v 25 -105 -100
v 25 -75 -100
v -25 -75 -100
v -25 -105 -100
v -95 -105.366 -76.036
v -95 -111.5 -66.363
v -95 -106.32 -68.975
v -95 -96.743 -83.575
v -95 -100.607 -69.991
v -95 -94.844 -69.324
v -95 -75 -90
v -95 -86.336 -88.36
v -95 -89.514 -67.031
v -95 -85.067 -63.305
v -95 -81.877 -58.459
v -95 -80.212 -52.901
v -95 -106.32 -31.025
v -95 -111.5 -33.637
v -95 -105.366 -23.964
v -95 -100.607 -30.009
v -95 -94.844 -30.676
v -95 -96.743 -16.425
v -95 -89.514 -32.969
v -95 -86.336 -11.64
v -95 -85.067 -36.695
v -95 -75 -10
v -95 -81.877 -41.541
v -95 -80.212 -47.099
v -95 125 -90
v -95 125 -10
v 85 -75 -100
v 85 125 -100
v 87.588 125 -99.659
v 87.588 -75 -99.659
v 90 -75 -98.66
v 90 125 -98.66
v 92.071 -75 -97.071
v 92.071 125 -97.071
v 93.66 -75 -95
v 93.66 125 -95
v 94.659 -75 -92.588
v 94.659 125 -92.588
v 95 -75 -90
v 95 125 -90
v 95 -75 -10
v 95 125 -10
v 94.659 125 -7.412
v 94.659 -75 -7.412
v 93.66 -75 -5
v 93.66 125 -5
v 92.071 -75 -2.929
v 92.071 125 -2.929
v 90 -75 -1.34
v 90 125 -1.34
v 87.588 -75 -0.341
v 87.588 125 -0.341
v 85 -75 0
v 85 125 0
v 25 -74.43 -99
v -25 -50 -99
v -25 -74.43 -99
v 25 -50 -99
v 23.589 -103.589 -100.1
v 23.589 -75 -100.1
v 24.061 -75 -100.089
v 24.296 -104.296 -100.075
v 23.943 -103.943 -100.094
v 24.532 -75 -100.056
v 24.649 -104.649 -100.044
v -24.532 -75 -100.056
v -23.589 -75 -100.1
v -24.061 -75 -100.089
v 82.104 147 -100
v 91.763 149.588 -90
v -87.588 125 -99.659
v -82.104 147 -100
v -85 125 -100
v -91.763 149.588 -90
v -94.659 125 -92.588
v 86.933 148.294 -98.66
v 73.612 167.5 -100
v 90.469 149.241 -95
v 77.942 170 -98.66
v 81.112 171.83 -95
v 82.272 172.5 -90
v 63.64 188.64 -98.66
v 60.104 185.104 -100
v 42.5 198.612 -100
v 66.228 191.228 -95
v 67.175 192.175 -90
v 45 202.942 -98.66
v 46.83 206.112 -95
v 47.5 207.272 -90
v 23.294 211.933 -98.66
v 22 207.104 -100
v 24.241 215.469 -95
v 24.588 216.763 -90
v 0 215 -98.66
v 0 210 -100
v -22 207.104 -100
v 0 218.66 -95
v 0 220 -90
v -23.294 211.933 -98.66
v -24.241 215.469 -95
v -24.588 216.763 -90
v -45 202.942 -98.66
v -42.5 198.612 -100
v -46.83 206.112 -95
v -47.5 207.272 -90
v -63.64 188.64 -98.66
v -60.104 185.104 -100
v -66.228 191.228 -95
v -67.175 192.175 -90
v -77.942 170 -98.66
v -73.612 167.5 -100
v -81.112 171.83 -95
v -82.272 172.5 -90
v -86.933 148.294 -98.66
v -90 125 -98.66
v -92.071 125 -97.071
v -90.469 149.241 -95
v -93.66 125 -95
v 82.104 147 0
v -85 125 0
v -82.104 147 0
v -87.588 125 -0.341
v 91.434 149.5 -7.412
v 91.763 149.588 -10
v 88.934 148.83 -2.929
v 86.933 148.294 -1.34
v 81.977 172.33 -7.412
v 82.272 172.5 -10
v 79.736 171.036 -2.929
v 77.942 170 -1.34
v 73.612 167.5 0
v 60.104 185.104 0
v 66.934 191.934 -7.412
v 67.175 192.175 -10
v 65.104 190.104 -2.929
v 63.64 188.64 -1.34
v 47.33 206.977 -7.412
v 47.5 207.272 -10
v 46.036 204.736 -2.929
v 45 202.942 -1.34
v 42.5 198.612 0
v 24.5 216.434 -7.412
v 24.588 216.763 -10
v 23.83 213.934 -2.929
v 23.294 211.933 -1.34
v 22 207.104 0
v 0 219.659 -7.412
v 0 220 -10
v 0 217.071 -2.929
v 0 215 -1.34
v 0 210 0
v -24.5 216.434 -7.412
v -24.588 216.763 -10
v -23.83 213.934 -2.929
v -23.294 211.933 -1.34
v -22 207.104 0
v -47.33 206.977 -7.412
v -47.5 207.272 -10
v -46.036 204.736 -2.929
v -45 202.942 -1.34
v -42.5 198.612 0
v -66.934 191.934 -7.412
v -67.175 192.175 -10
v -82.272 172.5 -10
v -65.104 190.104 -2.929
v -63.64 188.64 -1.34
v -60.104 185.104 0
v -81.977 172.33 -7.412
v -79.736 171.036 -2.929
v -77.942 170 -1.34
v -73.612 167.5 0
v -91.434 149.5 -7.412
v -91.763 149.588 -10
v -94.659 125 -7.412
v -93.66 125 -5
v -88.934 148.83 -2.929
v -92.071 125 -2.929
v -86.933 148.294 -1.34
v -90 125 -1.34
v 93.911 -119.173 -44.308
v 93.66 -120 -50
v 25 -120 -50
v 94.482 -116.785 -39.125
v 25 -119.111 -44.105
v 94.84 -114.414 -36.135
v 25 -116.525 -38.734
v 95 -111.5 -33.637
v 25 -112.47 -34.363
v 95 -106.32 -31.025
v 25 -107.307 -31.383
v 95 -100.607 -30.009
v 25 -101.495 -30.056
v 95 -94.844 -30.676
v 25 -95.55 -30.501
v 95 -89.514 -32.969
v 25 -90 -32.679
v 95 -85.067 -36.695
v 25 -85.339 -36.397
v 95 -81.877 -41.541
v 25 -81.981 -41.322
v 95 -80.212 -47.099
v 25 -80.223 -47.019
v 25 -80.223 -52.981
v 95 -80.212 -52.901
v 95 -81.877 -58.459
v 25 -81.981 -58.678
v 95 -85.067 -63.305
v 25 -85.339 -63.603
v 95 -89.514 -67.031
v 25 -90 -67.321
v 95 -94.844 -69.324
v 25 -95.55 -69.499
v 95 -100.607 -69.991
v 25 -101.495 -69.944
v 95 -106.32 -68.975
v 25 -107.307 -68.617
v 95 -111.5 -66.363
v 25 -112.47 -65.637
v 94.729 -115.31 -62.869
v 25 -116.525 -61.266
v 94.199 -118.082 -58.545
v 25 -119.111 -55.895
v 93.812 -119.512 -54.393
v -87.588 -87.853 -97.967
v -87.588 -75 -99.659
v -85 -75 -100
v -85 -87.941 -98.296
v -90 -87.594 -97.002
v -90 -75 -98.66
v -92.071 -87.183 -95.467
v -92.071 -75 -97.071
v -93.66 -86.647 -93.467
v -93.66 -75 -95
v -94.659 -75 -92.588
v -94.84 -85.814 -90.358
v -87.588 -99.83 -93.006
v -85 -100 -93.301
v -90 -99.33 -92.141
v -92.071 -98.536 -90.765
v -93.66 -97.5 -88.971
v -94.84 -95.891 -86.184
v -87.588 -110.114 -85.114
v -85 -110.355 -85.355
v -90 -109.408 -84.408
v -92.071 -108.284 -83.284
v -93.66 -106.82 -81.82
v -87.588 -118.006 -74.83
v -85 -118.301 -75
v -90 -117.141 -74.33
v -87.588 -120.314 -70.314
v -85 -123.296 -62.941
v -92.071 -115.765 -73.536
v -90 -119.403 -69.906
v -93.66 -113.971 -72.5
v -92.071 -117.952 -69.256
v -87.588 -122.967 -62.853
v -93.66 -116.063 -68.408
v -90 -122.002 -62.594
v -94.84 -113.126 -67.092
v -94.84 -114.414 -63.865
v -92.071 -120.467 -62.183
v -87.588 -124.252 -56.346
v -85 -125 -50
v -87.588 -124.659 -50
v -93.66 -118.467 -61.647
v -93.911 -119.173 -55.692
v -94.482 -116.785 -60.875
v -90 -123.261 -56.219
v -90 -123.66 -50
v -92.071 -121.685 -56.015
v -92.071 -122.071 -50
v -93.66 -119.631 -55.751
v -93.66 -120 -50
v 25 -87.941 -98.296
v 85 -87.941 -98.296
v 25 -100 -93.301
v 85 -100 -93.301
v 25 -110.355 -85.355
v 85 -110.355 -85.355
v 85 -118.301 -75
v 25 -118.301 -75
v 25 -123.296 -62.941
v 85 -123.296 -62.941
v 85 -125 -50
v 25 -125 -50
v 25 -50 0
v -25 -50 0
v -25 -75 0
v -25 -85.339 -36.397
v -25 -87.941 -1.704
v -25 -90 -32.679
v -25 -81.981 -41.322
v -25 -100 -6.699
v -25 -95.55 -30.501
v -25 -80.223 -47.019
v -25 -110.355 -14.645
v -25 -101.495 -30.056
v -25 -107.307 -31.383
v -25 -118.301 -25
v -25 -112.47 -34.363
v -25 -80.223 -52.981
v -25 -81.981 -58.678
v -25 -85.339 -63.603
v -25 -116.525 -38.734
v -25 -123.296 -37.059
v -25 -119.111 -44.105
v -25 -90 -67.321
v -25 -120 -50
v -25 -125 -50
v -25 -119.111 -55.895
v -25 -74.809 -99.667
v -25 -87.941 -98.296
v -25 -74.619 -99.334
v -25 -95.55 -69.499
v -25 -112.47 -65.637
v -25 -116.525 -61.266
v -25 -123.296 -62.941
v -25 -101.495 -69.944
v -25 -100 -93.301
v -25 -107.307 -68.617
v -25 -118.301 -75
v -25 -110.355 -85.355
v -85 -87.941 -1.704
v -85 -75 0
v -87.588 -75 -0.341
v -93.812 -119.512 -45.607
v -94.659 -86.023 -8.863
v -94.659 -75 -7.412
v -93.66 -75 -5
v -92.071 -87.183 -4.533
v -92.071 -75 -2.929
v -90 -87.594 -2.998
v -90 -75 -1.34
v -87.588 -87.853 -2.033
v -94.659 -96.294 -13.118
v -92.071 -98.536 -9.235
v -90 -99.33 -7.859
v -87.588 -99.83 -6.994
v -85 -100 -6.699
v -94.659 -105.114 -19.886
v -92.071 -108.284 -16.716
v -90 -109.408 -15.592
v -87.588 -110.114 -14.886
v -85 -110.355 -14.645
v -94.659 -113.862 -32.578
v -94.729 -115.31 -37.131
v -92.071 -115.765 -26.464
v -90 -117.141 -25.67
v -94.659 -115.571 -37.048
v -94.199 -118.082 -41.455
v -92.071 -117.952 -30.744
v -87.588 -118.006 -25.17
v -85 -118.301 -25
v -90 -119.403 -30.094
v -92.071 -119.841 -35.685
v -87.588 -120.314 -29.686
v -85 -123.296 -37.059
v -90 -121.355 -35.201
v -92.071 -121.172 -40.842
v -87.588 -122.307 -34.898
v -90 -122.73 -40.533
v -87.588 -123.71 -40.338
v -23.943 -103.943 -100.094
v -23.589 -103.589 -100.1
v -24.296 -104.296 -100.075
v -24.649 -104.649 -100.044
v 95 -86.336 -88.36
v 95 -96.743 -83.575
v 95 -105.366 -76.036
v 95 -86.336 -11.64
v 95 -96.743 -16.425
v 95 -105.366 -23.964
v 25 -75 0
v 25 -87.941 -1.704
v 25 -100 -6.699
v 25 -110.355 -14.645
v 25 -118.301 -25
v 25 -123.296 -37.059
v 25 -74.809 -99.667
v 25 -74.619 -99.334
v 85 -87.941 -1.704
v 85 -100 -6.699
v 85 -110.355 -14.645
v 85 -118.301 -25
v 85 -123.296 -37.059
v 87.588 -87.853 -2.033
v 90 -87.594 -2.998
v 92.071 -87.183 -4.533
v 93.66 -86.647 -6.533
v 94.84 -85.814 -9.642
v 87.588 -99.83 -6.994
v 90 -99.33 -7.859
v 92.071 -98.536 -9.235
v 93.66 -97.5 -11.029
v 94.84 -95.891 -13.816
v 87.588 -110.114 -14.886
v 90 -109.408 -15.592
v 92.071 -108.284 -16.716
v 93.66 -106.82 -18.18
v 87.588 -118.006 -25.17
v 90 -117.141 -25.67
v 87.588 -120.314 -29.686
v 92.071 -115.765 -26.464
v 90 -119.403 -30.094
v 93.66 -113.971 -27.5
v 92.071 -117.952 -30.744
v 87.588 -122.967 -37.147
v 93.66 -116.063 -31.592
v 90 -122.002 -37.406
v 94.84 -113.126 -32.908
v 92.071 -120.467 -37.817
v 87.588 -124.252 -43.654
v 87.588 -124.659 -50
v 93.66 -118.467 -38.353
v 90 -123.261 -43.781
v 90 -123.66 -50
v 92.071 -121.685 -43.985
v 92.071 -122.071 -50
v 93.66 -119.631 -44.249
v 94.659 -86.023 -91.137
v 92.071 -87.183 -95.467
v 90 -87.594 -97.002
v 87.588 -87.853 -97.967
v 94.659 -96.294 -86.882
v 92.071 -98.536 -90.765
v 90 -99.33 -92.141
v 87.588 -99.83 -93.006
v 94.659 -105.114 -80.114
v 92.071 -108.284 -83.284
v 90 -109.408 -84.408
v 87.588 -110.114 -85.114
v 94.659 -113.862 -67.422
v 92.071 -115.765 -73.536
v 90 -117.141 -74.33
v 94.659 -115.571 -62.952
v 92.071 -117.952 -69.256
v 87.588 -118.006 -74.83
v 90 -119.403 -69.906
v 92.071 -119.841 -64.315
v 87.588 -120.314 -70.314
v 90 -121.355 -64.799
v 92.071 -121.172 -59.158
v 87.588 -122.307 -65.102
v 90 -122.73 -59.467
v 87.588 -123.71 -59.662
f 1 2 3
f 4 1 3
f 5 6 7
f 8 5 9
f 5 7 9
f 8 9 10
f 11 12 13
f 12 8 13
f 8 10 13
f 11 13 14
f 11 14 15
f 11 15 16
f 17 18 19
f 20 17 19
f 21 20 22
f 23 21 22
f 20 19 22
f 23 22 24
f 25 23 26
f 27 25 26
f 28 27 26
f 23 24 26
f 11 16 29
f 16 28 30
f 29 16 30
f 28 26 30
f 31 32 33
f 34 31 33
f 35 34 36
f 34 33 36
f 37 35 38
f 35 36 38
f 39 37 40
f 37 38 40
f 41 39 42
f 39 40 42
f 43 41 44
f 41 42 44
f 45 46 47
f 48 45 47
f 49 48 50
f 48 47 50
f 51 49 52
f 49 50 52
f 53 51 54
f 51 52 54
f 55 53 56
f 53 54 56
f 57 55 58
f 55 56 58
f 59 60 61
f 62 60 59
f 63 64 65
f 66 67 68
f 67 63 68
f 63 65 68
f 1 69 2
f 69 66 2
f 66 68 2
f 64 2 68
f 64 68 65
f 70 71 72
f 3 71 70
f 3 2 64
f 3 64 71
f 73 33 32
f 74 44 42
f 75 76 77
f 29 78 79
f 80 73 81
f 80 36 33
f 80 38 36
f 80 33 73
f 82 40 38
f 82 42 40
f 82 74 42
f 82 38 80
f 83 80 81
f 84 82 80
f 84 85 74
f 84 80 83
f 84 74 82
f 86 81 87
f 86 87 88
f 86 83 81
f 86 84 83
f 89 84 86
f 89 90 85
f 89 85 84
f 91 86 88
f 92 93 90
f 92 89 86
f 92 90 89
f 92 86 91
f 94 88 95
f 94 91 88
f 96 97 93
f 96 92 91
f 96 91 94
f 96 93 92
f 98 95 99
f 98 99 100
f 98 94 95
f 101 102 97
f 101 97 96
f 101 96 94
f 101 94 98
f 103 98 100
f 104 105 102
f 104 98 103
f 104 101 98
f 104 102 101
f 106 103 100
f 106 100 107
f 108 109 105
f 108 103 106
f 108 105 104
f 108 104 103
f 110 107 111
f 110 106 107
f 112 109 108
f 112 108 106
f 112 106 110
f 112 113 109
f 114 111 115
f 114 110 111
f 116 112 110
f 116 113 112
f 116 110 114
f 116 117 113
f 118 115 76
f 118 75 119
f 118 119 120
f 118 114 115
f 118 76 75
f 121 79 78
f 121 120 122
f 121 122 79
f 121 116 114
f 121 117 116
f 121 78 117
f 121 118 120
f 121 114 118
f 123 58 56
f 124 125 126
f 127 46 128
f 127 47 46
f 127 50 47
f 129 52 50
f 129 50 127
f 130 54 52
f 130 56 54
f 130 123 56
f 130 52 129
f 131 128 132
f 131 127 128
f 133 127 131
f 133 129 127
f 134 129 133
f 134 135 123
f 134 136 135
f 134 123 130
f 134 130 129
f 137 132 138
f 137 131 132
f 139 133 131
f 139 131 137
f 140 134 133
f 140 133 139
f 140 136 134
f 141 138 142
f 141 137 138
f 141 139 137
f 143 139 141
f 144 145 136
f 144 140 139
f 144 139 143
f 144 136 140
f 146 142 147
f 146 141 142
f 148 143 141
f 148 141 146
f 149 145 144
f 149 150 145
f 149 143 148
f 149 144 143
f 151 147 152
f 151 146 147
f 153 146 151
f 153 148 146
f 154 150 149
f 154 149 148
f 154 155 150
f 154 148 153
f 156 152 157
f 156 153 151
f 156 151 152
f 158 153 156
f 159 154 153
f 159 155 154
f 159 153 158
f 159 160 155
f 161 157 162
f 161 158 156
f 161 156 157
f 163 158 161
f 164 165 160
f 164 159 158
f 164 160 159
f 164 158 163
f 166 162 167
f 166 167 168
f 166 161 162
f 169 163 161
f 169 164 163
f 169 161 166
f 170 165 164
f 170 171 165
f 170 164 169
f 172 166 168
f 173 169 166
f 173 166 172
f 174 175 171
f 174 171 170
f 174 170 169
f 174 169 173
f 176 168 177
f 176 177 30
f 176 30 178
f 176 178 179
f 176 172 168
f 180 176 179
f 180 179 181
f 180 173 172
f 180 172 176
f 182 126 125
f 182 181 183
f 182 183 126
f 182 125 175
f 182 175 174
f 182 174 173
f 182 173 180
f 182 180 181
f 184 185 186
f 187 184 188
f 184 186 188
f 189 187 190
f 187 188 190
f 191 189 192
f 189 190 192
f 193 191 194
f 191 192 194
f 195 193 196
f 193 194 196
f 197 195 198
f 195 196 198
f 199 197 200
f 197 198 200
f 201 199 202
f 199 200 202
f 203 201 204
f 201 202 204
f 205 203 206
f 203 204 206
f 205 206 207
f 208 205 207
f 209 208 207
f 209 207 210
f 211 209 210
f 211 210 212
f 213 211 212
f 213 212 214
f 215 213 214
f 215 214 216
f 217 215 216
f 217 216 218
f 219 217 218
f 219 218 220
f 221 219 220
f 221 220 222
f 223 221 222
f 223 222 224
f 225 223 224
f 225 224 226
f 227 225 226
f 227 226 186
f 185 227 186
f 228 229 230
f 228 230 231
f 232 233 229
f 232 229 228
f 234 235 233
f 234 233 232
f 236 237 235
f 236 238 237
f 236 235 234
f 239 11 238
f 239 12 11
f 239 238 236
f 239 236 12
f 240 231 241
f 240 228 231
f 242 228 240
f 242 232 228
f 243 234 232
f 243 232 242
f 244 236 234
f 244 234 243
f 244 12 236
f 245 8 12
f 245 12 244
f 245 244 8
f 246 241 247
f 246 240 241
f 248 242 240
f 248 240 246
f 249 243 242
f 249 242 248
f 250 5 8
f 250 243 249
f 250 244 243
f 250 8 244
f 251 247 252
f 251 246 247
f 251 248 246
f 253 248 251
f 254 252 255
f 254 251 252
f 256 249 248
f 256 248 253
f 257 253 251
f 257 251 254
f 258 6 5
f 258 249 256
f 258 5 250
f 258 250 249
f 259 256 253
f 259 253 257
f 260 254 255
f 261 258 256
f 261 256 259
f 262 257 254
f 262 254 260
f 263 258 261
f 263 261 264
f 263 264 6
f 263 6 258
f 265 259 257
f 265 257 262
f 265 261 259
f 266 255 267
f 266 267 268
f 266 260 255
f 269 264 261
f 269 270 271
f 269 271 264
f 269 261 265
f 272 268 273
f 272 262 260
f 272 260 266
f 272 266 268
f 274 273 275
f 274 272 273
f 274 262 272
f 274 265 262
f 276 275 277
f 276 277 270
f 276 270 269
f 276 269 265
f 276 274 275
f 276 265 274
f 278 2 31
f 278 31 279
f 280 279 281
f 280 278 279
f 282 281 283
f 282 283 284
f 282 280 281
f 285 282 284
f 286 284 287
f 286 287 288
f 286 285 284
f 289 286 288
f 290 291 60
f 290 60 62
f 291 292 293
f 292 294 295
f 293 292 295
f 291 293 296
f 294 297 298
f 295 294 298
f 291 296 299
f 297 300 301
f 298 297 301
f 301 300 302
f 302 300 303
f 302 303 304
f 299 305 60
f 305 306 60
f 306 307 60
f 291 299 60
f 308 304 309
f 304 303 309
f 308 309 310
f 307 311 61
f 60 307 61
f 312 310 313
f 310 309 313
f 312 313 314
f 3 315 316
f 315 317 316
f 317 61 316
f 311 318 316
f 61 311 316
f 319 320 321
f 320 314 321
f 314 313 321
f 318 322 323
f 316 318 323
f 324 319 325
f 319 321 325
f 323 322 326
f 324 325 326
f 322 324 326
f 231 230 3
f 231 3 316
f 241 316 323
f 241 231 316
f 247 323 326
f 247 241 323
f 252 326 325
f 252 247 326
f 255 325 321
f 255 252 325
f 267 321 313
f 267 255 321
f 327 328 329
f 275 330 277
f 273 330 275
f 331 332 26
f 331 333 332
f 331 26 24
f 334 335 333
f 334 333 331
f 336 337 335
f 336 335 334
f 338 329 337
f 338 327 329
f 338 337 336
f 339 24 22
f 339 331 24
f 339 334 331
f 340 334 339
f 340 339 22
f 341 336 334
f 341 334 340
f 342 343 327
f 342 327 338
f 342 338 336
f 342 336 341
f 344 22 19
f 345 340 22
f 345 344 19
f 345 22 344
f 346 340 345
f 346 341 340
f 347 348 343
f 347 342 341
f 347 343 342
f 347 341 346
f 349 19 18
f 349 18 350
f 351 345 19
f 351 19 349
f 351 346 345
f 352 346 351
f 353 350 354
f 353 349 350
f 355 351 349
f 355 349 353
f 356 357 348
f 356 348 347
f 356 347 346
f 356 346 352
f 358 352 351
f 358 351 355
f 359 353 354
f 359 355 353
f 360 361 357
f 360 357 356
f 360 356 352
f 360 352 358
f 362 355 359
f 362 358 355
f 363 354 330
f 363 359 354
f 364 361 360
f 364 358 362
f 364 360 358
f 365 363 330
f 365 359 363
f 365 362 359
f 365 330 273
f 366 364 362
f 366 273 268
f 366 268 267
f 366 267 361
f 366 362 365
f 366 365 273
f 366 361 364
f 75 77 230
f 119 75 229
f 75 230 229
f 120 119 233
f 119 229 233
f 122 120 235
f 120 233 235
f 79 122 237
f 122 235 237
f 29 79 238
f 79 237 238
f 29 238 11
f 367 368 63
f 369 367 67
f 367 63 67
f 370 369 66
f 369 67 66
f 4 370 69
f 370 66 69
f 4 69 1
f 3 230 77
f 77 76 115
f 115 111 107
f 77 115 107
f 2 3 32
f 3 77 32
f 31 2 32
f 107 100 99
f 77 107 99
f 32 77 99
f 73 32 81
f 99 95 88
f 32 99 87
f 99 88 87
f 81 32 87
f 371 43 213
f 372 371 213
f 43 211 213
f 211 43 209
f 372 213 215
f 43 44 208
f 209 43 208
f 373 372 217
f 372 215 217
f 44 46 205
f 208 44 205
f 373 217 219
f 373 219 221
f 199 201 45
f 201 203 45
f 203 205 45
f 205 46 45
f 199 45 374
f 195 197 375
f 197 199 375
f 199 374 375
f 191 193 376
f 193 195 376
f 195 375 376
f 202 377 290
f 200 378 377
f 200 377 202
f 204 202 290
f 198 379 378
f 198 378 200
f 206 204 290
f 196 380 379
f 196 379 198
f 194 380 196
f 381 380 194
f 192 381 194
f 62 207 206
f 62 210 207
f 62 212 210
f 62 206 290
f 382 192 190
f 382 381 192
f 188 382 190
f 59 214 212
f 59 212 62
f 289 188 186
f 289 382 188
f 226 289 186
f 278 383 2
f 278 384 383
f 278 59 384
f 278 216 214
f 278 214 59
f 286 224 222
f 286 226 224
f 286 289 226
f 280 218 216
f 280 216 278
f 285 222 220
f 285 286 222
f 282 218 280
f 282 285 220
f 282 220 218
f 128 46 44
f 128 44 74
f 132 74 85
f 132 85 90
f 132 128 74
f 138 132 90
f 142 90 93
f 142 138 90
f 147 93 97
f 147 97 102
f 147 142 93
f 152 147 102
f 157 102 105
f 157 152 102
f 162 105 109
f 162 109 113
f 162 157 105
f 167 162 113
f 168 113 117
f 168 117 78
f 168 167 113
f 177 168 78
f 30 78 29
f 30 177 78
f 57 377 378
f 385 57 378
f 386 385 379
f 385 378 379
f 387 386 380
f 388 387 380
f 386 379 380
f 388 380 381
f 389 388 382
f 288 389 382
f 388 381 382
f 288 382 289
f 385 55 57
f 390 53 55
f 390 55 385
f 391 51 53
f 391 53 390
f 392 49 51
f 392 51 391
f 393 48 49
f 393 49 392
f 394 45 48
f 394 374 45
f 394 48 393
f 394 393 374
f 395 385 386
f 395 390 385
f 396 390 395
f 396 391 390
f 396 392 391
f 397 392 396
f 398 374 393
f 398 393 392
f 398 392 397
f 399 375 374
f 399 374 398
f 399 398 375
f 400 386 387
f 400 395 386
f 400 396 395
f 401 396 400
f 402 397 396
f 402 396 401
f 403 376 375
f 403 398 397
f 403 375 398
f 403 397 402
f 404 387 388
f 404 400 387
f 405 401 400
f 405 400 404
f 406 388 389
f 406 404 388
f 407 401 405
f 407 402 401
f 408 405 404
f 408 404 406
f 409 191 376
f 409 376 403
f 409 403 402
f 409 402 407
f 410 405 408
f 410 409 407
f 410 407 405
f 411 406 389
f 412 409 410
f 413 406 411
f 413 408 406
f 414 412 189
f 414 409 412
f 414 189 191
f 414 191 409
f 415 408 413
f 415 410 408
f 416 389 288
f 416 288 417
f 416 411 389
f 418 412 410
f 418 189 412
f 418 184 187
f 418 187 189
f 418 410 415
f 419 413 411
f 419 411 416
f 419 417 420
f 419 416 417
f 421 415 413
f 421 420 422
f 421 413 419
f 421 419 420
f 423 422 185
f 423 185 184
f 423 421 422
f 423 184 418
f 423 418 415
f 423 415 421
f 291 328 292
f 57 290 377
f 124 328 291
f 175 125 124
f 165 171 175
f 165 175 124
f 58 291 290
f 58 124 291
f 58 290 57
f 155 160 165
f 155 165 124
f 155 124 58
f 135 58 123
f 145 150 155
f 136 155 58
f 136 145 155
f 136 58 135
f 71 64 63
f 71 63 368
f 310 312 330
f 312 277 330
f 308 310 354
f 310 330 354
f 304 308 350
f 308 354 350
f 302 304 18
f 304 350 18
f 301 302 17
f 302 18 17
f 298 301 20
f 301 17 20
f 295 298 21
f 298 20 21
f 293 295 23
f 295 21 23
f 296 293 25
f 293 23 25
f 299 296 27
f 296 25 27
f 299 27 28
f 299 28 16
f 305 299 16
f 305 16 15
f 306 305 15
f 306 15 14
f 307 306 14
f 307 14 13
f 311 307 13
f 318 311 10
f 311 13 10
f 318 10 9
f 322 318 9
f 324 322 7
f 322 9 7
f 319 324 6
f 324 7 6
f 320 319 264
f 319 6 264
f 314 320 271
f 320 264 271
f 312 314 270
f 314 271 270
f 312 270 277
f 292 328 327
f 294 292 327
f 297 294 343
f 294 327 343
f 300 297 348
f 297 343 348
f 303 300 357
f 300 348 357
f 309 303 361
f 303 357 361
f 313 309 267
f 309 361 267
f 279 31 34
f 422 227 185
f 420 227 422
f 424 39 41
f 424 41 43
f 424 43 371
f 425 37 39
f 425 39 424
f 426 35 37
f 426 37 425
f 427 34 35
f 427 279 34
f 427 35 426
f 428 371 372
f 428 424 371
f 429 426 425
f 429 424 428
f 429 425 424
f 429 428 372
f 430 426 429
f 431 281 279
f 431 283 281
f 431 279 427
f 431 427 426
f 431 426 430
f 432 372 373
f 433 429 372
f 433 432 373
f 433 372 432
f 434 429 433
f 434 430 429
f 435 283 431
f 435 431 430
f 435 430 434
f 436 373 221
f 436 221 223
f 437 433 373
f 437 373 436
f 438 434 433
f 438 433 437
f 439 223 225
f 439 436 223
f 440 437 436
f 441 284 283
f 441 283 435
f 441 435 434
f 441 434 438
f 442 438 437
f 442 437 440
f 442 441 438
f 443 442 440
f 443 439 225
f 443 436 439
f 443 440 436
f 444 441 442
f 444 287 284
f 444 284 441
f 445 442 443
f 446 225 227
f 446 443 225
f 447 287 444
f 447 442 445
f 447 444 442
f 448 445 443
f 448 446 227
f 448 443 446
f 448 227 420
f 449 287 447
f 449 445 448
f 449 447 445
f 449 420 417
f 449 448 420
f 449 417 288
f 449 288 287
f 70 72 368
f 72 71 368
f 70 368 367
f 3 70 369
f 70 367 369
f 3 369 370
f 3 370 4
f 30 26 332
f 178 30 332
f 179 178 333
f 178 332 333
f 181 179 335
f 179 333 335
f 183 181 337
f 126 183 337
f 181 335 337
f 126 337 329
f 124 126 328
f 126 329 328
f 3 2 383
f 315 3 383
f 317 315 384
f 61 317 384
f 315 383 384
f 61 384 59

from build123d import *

# Parameters (mm, degrees)
BOSS_EXTRUDE1_DEPTH    = 100
SKETCH2_W              = 50
SKETCH2_H              = 50
CUT_EXTRUDE1_DEPTH     = 187.14510469
CUT_EXTRUDE2_DEPTH     = 25
SKETCH7_R              = 20
CUT_EXTRUDE3_DEPTH     = 249.445164976
FILLET2_R              = 50
CUT_EXTRUDE6_START     = -125
CUT_EXTRUDE6_OUTLINE_W = 50
CUT_EXTRUDE6_OUTLINE_H = 6.698729811
CUT_EXTRUDE6_DEPTH     = 50
CUT_EXTRUDE7_DEPTH     = 25
BOSS_EXTRUDE2_DEPTH    = 100
FILLET4_R              = 10
SKETCH11_W             = 50
SKETCH11_H             = 25
CUT_EXTRUDE11_DEPTH    = 99
SKETCH16_W             = 50
SKETCH16_H             = 30
BOSS_EXTRUDE3_DEPTH    = 0.1
FILLET5_R              = 10


with BuildPart() as part:
    # Sketch1 → Boss-Extrude1 (new body)
    with BuildSketch(Plane.XY):
        Polygon((-95, 125), (20.2, 125), (69.8, 125), (95, 125), (95, -125), (-95, -125), align=None)
    extrude(amount=-BOSS_EXTRUDE1_DEPTH)

    # Sketch2 → Cut-Extrude1 (cut, through all)
    with BuildSketch(Plane.XY):
        with Locations((0, -125)):
            Rectangle(SKETCH2_W, SKETCH2_H)
    extrude(amount=-CUT_EXTRUDE1_DEPTH, mode=Mode.SUBTRACT)

    # Sketch6 → Cut-Extrude2 (cut, symmetric)
    with BuildSketch(Plane(origin=(0, 0, 0), x_dir=(0, 0, -1), z_dir=(1, 0, 0))):
        with BuildLine():
            Line((100, -100), (0, -100))
            ThreePointArc((0, -100), (50, -50), (100, -100))
        make_face()
    extrude(amount=CUT_EXTRUDE2_DEPTH, both=True, mode=Mode.SUBTRACT)

    # Sketch7 → Cut-Extrude3 (cut, through all)
    with BuildSketch(Plane.ZY.offset(95)):
        with Locations(Location((-50, -100, 0), (0, 0, 270))):
            Circle(SKETCH7_R)
    extrude(amount=-CUT_EXTRUDE3_DEPTH, mode=Mode.SUBTRACT)

    # Fillet2
    fillet2_edges = [part.edges().sort_by_distance(p)[0] for p in [
        (-60, -125, -100),
        (-60, -125, 0),
    ]]
    fillet(fillet2_edges, radius=FILLET2_R - 0.0001)  # a hair under: the kernel refuses the full size

    # Cut-Extrude6: read off the stored shape, not the designer's step
    # Cut-Extrude6 outline → Cut-Extrude6 (cut)
    with BuildSketch(Plane(origin=(0, 0, 0), x_dir=(1, 0, 0), z_dir=(0, 1, 0)).offset(CUT_EXTRUDE6_START)):
        with Locations((0, 96.650635095)):
            Rectangle(CUT_EXTRUDE6_OUTLINE_W, CUT_EXTRUDE6_OUTLINE_H)
        with Locations((0, 3.349364906)):
            Rectangle(CUT_EXTRUDE6_OUTLINE_W, CUT_EXTRUDE6_OUTLINE_H)
    extrude(amount=CUT_EXTRUDE6_DEPTH, mode=Mode.SUBTRACT)

    # Sketch10 → Cut-Extrude7 (cut, symmetric)
    with BuildSketch(Plane(origin=(0, 0, 0), x_dir=(0, 0, -1), z_dir=(1, 0, 0))):
        with BuildLine():
            Line((0, -75), (100, -75))
            ThreePointArc((100, -75), (50, -61.602540378), (0, -75))
        make_face()
    extrude(amount=CUT_EXTRUDE7_DEPTH, both=True, mode=Mode.SUBTRACT)

    # Sketch15 → Boss-Extrude2 (add)
    with BuildSketch(Plane.XY):
        with BuildLine():
            Line((-95, 125), (95, 125))
            ThreePointArc((95, 125), (0, 220), (-95, 125))
        make_face()
    extrude(amount=-BOSS_EXTRUDE2_DEPTH)

    # Fillet4
    # the kernel refuses this fillet: 10 mm, written as the material it takes off along each edge
    with BuildSketch(Plane(origin=(0, 125, -100), x_dir=(1, 0, 0), z_dir=(0, -1, 0))) as fillet4_piece_1:
        with BuildLine():
            CenterArc((95 - FILLET4_R, FILLET4_R), FILLET4_R, 270, 90)
            Line((95, FILLET4_R), (95, 0))
            Line((95, 0), (95 - FILLET4_R, 0))
        make_face()
    revolve(axis=Axis((0, 125, -100), (0, 0, 1)), revolution_arc=180, mode=Mode.SUBTRACT)
    with BuildSketch(Plane(origin=(0, 125, 0), x_dir=(1, 0, 0), z_dir=(0, -1, 0))) as fillet4_piece_2:
        with BuildLine():
            CenterArc((95 - FILLET4_R, -FILLET4_R), FILLET4_R, 0, 90)
            Line((95, -FILLET4_R), (95, 0))
            Line((95, 0), (95 - FILLET4_R, 0))
        make_face()
    revolve(axis=Axis((0, 125, 0), (0, 0, 1)), revolution_arc=180, mode=Mode.SUBTRACT)
    with BuildSketch(Plane(origin=(-95, -75.0001, -100), x_dir=(0, 0, 1), z_dir=(0, 1, 0)), Plane(origin=(95, 125, 0), x_dir=(-1, 0, 0), z_dir=(0, -1, 0))) as fillet4_piece_3:
        with BuildLine():
            CenterArc((FILLET4_R, FILLET4_R), FILLET4_R, 180, 90)
            Line((0, FILLET4_R), (0, 0))
            Line((0, 0), (FILLET4_R, 0))
        make_face()
    extrude(amount=200.0001, mode=Mode.SUBTRACT)
    with BuildSketch(Plane(origin=(95, 125, -100), x_dir=(-1, 0, 0), z_dir=(0, -1, 0)), Plane(origin=(-95, -75.0001, 0), x_dir=(0, 0, -1), z_dir=(0, 1, 0))) as fillet4_piece_4:
        with BuildLine():
            CenterArc((FILLET4_R, -FILLET4_R), FILLET4_R, 90, 90)
            Line((0, -FILLET4_R), (0, 0))
            Line((0, 0), (FILLET4_R, 0))
        make_face()
    extrude(amount=200.0001, mode=Mode.SUBTRACT)
    with BuildSketch(Plane(origin=(95, -75.0001, -49.9999), x_dir=(0, 0, 1), z_dir=(0, 1, 0))) as fillet4_piece_5:
        with BuildLine():
            CenterArc((49.9999 - FILLET4_R, -FILLET4_R), FILLET4_R, 0, 90)
            Line((49.9999 - FILLET4_R, 0), (49.9999, 0))
            Line((49.9999, 0), (49.9999, -FILLET4_R))
        make_face()
    revolve(axis=Axis((95, -75.0001, -49.9999), (1, 0, 0)), revolution_arc=90, mode=Mode.SUBTRACT)
    with BuildSketch(Plane(origin=(95, -75.0001, -50.0001), x_dir=(0, 0, -1), z_dir=(0, 1, 0))) as fillet4_piece_6:
        with BuildLine():
            CenterArc((49.9999 - FILLET4_R, FILLET4_R), FILLET4_R, 270, 90)
            Line((49.9999, FILLET4_R), (49.9999, 0))
            Line((49.9999, 0), (49.9999 - FILLET4_R, 0))
        make_face()
    revolve(axis=Axis((95, -75.0001, -50.0001), (-1, 0, 0)), revolution_arc=90, mode=Mode.SUBTRACT)
    with BuildSketch(Plane(origin=(-95, -75.0001, -49.9999), x_dir=(0, 0, 1), z_dir=(0, 1, 0))) as fillet4_piece_7:
        with BuildLine():
            CenterArc((49.9999 - FILLET4_R, FILLET4_R), FILLET4_R, 270, 90)
            Line((49.9999, FILLET4_R), (49.9999, 0))
            Line((49.9999, 0), (49.9999 - FILLET4_R, 0))
        make_face()
    revolve(axis=Axis((-95, -75.0001, -49.9999), (1, 0, 0)), revolution_arc=90, mode=Mode.SUBTRACT)
    with BuildSketch(Plane(origin=(-95, -75.0001, -50.0001), x_dir=(0, 0, -1), z_dir=(0, 1, 0))) as fillet4_piece_8:
        with BuildLine():
            CenterArc((49.9999 - FILLET4_R, -FILLET4_R), FILLET4_R, 0, 90)
            Line((49.9999, -FILLET4_R), (49.9999, 0))
            Line((49.9999, 0), (49.9999 - FILLET4_R, 0))
        make_face()
    revolve(axis=Axis((-95, -75.0001, -50.0001), (-1, 0, 0)), revolution_arc=90, mode=Mode.SUBTRACT)
    with BuildSketch(Plane(origin=(-95, -125, -49.9999), x_dir=(0, 1, 0), z_dir=(0, 0, -1))) as fillet4_piece_9:
        with BuildLine():
            CenterArc((FILLET4_R, FILLET4_R), FILLET4_R, 180, 90)
            Line((0, FILLET4_R), (0, 0))
            Line((0, 0), (FILLET4_R, 0))
        make_face()
    extrude(amount=0.0002, mode=Mode.SUBTRACT)
    with BuildSketch(Plane(origin=(95, -125, -49.9999), x_dir=(0, 1, 0), z_dir=(0, 0, -1))) as fillet4_piece_10:
        with BuildLine():
            CenterArc((FILLET4_R, -FILLET4_R), FILLET4_R, 90, 90)
            Line((0, -FILLET4_R), (0, 0))
            Line((0, 0), (FILLET4_R, 0))
        make_face()
    extrude(amount=0.0002, mode=Mode.SUBTRACT)

    # Sketch11 → Cut-Extrude11 (cut)
    with BuildSketch(Plane.XY):
        with Locations((0, -62.5)):
            Rectangle(SKETCH11_W, SKETCH11_H)
    extrude(amount=-CUT_EXTRUDE11_DEPTH, mode=Mode.SUBTRACT)


with BuildPart() as body_2:
    # Sketch16 → Boss-Extrude3 (new body)
    with BuildSketch(Plane(origin=(0, 0, -100), x_dir=(-1, 0, 0), z_dir=(0, 0, -1))):
        with Locations((0, -90)):
            Rectangle(SKETCH16_W, SKETCH16_H)
    extrude(amount=BOSS_EXTRUDE3_DEPTH)

    # Fillet5
    # the kernel refuses this fillet: 10 mm, written as the material it takes off along each edge
    with BuildSketch(Plane(origin=(25, -71.473316005, -100.1), x_dir=(0, 0, 1), z_dir=(0, -1, 0)), Plane(origin=(-25, -108.526683995, -100.1), x_dir=(0, 0, 1), z_dir=(0, 1, 0))) as fillet5_piece_1:
        with BuildLine():
            CenterArc((10, 1.410673598), FILLET5_R, 180, 8.109614456)
            Line((0, 1.410673598), (0, 0))
            Line((0, 0), (0.1, 0))
        make_face()
    extrude(amount=37.05336799, mode=Mode.SUBTRACT)
    with BuildSketch(Plane(origin=(28.526683995, -105, -100.1), x_dir=(0, 0, 1), z_dir=(-1, 0, 0))) as fillet5_piece_2:
        with BuildLine():
            CenterArc((10, 1.410673598), FILLET5_R, 180, 8.109614456)
            Line((0, 1.410673598), (0, 0))
            Line((0, 0), (0.1, 0))
        make_face()
    extrude(amount=57.05336799, mode=Mode.SUBTRACT)


solid = Compound([part.part, body_2.part])
